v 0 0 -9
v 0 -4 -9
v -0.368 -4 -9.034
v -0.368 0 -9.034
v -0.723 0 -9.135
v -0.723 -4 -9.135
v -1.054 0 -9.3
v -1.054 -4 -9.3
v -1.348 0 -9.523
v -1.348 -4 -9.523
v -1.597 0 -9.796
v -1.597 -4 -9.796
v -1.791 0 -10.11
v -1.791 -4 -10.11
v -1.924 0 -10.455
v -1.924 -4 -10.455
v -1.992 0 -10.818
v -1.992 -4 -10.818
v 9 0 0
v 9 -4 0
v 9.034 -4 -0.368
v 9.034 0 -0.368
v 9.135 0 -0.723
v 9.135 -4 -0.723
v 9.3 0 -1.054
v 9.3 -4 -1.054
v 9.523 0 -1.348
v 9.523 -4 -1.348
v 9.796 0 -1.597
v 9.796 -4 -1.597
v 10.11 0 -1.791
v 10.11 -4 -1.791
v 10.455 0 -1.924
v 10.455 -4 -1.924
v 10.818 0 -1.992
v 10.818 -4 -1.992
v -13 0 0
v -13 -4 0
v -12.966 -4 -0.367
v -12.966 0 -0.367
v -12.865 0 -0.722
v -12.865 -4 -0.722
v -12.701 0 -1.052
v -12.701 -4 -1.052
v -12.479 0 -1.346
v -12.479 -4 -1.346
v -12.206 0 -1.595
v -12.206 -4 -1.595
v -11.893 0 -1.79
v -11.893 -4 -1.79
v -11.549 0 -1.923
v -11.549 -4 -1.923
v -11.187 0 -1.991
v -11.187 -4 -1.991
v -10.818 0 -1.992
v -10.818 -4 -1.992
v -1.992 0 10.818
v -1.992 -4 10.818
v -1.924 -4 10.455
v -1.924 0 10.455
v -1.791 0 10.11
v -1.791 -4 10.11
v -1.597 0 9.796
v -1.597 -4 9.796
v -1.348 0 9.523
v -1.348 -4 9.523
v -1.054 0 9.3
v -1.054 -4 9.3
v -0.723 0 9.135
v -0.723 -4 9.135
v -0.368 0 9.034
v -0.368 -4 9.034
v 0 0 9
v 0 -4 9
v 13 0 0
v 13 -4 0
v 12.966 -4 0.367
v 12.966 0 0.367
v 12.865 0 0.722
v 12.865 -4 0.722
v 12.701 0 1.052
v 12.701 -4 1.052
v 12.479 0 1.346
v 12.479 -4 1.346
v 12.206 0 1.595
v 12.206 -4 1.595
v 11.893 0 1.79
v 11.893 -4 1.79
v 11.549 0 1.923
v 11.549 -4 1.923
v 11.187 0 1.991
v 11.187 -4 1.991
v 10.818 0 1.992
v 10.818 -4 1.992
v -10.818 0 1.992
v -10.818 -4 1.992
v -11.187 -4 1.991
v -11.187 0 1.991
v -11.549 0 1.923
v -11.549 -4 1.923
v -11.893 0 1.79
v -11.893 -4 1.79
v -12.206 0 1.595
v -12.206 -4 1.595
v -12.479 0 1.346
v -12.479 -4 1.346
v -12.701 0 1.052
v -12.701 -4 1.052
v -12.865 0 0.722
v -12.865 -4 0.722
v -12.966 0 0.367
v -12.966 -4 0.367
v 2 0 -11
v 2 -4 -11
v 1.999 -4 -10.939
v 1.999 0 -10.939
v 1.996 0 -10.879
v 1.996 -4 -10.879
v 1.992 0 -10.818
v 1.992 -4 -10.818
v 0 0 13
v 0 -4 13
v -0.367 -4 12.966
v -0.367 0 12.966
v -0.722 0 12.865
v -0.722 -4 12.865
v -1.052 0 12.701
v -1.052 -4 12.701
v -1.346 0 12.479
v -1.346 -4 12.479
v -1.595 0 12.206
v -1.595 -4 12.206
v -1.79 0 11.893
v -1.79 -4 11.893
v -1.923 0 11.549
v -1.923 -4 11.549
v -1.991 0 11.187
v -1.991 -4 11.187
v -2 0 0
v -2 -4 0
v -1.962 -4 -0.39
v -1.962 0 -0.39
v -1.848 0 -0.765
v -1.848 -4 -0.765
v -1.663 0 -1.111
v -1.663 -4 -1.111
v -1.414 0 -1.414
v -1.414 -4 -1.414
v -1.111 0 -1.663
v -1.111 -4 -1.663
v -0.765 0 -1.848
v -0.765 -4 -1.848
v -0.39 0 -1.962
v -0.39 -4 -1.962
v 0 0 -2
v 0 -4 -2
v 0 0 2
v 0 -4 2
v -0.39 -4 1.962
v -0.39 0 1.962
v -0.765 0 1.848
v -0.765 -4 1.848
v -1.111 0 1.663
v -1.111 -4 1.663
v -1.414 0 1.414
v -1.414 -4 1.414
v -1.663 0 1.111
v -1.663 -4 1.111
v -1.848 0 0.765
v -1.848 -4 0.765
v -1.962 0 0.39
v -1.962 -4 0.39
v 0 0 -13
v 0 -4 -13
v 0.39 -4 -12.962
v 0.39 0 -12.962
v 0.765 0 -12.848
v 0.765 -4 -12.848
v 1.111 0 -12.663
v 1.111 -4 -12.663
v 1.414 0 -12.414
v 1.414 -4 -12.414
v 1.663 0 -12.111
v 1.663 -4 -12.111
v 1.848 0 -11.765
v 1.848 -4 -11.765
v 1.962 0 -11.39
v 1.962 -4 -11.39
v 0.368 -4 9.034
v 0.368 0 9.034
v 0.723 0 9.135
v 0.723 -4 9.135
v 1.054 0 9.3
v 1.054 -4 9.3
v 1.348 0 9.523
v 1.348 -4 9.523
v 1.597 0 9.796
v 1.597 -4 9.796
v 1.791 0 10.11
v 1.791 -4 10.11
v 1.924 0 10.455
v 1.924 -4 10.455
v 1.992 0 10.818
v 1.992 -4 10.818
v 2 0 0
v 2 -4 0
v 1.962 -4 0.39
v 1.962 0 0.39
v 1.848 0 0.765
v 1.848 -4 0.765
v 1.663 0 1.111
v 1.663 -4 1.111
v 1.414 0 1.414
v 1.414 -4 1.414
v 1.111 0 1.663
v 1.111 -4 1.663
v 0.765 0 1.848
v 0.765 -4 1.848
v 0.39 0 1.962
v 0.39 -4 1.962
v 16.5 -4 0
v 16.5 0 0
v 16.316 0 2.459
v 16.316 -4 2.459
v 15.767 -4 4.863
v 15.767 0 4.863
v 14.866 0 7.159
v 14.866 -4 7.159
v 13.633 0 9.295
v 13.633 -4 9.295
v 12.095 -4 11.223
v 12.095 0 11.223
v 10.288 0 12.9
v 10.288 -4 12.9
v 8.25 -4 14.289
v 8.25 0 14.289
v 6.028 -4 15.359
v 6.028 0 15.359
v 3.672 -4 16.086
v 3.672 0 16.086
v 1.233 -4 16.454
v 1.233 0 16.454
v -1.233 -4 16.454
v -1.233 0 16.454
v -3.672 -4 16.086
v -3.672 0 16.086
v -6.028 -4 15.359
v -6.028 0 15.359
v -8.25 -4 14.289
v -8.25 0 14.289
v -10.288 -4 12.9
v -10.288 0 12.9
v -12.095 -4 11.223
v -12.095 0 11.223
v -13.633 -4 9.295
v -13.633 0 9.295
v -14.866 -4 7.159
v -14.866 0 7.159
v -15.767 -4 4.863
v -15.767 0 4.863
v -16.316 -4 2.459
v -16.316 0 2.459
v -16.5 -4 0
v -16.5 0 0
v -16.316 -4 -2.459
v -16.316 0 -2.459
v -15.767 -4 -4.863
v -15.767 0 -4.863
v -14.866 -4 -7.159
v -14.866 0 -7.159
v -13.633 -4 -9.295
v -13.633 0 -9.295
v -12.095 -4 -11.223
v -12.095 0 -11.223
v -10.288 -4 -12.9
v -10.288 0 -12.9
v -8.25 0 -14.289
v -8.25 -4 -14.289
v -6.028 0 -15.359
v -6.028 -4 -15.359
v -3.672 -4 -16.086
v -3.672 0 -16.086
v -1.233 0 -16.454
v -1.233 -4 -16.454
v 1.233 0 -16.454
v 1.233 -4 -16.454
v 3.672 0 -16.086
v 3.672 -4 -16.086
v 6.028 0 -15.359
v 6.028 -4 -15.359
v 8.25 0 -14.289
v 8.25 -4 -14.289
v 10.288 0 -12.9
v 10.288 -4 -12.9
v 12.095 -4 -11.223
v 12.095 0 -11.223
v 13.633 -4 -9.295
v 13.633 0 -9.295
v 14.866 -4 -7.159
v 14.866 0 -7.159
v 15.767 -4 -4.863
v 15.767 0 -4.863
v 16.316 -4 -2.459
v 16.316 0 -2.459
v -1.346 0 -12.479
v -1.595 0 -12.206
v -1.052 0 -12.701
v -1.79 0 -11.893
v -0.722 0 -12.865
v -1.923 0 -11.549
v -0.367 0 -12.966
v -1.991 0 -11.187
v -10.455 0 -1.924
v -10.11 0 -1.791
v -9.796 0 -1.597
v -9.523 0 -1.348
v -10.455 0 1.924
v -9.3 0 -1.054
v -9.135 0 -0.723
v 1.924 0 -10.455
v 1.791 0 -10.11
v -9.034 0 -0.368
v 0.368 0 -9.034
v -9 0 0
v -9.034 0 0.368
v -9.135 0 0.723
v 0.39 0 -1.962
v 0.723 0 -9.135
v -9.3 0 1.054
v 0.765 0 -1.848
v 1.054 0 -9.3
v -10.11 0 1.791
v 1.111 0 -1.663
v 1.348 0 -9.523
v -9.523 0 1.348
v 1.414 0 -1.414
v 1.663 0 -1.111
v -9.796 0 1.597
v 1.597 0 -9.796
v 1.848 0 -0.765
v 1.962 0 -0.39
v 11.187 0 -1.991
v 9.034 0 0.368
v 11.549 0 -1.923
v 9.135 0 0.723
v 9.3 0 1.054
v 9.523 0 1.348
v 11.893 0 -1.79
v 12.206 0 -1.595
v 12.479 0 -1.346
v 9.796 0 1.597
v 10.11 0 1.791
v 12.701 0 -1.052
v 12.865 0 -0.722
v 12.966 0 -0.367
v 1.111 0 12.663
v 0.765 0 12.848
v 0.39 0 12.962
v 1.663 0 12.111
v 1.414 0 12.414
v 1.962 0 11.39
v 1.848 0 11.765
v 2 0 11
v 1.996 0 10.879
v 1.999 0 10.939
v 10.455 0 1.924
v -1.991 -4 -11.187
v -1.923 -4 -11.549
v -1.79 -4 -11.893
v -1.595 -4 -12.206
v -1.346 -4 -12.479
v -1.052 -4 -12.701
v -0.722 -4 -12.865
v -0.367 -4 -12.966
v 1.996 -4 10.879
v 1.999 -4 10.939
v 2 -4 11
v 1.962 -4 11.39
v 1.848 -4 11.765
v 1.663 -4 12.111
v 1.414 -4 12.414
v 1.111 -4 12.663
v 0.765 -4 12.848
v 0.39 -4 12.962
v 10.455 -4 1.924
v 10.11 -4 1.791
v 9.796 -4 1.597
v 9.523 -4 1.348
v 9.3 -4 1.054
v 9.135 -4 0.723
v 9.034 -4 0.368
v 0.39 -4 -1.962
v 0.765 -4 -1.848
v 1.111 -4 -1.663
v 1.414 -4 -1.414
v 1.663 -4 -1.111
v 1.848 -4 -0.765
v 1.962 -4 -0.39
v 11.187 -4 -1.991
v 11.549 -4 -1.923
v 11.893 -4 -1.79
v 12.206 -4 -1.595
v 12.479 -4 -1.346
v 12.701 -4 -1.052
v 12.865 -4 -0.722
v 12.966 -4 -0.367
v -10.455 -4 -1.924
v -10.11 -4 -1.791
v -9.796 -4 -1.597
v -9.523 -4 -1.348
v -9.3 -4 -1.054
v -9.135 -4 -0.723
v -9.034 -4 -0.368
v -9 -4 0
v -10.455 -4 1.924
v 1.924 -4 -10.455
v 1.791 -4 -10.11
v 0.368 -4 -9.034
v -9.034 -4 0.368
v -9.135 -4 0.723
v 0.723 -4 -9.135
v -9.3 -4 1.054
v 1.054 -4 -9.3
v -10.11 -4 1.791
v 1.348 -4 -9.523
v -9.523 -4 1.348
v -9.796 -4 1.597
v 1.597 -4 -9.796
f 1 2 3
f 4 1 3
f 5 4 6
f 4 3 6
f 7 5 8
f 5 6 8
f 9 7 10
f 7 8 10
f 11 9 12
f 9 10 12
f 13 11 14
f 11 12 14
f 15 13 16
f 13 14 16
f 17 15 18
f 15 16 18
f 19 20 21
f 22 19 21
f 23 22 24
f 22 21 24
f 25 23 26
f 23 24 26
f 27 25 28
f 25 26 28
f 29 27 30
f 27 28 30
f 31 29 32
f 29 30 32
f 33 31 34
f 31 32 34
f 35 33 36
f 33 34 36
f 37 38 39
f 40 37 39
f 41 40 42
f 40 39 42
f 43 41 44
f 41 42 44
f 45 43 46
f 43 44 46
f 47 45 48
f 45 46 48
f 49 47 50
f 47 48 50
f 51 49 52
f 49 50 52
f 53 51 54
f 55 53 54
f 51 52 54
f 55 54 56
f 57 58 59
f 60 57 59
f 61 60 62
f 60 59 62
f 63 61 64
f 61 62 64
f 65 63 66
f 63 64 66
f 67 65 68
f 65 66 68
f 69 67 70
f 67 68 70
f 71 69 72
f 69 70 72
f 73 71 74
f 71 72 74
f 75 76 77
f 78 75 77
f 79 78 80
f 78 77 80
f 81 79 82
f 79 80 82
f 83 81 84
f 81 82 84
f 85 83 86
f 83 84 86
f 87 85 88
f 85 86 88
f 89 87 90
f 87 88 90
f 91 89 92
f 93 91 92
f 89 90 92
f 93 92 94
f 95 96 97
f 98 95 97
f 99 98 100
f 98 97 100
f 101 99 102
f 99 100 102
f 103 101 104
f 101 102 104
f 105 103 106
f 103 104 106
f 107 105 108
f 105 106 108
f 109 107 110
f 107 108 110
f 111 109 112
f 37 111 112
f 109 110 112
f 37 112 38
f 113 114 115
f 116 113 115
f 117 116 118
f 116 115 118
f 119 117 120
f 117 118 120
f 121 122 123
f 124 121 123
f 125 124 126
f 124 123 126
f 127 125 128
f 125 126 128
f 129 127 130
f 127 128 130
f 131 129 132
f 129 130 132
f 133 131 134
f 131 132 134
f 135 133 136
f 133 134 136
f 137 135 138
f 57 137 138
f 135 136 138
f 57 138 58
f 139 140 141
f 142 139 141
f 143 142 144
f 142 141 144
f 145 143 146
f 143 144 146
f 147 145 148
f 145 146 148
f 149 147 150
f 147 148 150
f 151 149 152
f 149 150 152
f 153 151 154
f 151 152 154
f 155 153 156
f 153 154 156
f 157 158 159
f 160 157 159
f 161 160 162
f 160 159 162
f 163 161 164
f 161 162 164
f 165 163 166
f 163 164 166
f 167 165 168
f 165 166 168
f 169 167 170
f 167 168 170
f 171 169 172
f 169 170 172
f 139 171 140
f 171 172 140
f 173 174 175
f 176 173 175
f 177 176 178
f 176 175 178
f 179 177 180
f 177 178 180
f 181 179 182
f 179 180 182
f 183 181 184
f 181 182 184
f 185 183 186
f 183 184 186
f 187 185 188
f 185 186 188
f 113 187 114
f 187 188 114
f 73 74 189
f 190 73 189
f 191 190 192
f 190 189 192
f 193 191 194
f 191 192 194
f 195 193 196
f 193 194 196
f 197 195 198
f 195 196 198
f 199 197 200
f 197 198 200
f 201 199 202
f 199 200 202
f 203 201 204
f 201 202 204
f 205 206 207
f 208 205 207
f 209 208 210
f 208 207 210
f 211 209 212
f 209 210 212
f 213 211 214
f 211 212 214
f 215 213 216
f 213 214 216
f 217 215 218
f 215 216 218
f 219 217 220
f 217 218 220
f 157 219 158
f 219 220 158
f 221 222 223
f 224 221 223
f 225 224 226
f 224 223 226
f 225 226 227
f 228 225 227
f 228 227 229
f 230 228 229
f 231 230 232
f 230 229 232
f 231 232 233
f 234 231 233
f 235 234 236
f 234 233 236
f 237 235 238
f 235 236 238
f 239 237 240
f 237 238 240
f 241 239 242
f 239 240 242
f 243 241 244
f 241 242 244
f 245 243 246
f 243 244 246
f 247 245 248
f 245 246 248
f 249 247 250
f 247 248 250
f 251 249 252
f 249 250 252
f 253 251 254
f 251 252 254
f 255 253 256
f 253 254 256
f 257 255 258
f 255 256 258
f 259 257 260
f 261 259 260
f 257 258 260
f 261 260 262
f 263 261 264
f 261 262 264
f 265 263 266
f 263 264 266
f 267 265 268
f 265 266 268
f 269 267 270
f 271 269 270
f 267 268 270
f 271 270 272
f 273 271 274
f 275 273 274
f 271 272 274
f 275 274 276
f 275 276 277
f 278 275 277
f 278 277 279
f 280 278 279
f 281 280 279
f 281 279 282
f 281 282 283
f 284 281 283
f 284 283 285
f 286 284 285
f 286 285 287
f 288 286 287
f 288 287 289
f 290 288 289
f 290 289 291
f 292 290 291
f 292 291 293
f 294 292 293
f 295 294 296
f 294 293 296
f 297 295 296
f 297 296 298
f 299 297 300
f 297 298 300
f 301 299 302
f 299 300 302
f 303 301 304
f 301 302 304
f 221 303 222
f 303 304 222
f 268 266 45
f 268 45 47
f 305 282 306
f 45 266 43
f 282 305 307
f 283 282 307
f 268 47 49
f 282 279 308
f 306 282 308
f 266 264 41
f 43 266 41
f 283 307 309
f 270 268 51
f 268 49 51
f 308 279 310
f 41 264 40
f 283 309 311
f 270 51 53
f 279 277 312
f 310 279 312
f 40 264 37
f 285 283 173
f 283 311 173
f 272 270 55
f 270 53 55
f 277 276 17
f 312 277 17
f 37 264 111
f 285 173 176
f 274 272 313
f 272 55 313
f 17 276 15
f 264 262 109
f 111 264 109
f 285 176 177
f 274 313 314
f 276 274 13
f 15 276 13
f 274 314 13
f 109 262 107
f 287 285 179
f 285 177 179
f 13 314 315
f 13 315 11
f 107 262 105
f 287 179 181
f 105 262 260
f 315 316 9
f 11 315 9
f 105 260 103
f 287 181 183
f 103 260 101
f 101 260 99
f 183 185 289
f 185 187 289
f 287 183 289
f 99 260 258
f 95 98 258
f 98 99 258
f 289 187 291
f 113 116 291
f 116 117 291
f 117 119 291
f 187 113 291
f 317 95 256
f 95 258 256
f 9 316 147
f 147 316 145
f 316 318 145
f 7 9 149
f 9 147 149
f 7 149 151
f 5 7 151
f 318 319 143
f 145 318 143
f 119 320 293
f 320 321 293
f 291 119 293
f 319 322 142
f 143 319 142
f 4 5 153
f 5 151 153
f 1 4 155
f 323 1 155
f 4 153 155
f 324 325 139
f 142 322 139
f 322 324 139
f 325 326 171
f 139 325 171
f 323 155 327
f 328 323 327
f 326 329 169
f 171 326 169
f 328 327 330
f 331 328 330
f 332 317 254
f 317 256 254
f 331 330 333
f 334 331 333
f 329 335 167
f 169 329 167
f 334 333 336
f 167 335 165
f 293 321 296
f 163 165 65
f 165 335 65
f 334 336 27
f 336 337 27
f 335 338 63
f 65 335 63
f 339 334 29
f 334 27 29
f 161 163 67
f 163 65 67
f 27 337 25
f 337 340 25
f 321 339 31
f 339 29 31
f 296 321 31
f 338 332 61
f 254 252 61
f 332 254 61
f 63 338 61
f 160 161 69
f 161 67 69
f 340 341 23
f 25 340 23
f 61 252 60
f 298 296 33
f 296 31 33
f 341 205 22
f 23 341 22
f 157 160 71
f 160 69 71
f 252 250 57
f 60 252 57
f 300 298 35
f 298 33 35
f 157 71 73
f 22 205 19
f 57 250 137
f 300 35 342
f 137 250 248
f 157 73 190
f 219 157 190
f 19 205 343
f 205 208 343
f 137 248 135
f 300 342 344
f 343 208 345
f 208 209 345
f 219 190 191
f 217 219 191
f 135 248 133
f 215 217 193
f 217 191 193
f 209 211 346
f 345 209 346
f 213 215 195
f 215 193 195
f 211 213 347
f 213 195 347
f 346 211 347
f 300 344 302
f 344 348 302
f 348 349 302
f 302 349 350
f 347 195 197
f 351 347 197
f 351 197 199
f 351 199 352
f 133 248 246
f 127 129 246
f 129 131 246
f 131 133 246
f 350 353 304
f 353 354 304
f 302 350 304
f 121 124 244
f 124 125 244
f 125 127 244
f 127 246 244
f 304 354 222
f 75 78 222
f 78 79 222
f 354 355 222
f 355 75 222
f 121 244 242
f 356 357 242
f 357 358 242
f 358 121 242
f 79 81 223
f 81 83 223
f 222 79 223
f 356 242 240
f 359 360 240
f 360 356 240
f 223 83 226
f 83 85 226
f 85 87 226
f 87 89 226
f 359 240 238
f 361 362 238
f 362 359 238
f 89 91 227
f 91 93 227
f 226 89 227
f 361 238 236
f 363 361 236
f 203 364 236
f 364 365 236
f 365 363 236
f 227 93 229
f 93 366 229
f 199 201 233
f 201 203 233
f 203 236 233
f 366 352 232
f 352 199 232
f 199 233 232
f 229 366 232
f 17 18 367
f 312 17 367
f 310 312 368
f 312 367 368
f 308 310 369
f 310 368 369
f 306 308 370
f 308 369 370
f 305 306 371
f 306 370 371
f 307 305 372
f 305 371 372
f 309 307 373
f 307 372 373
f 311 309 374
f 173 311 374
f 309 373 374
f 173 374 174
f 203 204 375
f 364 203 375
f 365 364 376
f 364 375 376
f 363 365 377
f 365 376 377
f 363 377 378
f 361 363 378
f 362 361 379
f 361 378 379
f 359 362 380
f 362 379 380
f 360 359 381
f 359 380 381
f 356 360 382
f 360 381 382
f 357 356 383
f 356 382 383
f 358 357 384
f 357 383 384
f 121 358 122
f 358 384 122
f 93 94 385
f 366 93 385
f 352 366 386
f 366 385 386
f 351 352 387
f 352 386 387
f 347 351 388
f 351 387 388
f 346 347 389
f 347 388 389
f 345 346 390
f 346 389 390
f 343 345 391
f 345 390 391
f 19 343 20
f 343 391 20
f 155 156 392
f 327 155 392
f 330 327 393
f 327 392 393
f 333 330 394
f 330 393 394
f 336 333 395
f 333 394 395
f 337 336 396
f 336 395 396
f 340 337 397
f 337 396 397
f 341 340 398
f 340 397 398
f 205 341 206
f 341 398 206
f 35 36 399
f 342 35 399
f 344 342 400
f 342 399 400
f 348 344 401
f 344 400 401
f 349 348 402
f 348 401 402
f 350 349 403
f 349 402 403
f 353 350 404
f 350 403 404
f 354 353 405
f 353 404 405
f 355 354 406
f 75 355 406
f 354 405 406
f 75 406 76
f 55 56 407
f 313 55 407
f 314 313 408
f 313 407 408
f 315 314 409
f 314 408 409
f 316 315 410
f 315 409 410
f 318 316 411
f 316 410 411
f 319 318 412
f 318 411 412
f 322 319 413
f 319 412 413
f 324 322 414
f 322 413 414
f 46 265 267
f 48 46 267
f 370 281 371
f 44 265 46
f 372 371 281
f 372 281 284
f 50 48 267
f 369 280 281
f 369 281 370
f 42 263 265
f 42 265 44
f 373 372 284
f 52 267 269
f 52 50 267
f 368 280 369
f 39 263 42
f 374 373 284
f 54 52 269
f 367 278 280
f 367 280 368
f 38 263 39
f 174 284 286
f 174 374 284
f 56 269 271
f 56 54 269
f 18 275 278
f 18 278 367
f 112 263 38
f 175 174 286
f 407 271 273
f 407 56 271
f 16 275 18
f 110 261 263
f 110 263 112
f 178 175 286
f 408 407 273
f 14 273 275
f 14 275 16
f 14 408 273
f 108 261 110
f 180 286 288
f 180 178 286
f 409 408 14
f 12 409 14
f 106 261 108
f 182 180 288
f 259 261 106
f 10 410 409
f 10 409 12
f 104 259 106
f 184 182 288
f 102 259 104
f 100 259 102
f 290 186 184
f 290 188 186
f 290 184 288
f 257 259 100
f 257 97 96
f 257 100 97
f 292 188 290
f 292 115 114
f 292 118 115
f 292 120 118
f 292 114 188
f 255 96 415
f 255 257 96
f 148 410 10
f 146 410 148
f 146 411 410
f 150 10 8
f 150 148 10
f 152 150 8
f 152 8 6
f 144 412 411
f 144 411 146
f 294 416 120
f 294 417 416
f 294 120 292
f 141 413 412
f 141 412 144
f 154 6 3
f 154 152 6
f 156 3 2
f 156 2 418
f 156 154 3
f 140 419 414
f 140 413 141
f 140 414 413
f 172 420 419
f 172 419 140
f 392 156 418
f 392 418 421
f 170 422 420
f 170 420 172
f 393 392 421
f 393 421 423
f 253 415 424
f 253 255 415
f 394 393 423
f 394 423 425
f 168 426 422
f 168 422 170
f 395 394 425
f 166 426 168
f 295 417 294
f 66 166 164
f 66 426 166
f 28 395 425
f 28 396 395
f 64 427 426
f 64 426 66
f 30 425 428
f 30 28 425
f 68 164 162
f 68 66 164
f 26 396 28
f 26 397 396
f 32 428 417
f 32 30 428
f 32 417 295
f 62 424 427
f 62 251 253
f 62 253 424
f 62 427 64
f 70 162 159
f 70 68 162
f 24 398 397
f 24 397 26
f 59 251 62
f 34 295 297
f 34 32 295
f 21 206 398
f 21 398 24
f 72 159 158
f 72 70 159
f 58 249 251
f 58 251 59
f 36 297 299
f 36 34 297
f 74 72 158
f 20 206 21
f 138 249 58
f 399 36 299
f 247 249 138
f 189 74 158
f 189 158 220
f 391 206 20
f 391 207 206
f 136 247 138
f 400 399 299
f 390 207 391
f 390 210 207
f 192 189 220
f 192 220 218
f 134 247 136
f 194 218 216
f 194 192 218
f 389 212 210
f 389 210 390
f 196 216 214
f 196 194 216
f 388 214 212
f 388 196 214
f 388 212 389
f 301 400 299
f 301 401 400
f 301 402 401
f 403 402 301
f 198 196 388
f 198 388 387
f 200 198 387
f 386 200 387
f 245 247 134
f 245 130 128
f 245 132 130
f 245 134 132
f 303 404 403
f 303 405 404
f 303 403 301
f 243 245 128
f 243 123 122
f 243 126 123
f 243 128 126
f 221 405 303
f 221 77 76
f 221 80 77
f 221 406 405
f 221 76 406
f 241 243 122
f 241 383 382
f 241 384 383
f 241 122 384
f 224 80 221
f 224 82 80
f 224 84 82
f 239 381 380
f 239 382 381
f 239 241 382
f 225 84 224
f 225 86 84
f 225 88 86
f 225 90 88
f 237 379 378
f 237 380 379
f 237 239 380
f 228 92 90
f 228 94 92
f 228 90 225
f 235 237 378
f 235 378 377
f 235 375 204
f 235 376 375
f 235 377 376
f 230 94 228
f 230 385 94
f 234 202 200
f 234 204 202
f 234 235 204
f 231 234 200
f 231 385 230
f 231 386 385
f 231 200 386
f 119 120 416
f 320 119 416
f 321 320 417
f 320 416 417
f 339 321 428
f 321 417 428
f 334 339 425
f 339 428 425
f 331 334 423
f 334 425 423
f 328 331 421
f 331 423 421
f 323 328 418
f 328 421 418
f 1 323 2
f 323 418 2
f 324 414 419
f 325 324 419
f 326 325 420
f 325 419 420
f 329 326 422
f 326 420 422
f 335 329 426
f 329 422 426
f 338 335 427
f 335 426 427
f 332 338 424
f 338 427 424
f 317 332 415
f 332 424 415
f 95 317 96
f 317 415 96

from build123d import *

# Parameters (mm, degrees)
F0_R     = 16.5
F1_DEPTH = 4
F3_DEPTH = 4.001


with BuildPart() as f1:
    # F0 (on Front) → F1 (new body)
    with BuildSketch(Plane.XZ):
        Circle(F0_R)
    extrude(amount=F1_DEPTH)

    # F2 (on face) → F3 (cut, through all)
    with BuildSketch(Plane.XZ.offset(4)):
        with BuildLine():
            ThreePointArc((-10.8181818182, -1.9917183909), (-9.5229021082, -1.3483997249), (-9, 0))
            Line((-9, 0), (-9.5, 0))
            Line((-9.5, 0), (-11, 0))
            ThreePointArc((-11, 0), (-10.9544511501, -1), (-10.8181818182, -1.9917183909))
        make_face()
        with BuildLine():
            Line((-9.5, 0), (-9, 0))
            ThreePointArc((-9, 0), (-9.5229021082, 1.3483997249), (-10.8181818182, 1.9917183909))
            ThreePointArc((-10.8181818182, 1.9917183909), (-10.9544511501, 1), (-11, 0))
            Line((-11, 0), (-9.5, 0))
        make_face()
        with BuildLine():
            ThreePointArc((0, 2), (-1.4142135624, 1.4142135624), (-2, 0))
            Line((-2, 0), (0, 0))
            Line((0, 0), (0, 2))
        make_face()
        with BuildLine():
            Line((0, 0), (-2, 0))
            ThreePointArc((-2, 0), (-1.4142135624, -1.4142135624), (0, -2))
            Line((0, -2), (0, 0))
        make_face()
        with BuildLine():
            ThreePointArc((-11, 0), (-10.9544511501, 1), (-10.8181818182, 1.9917183909))
            ThreePointArc((-10.8181818182, 1.9917183909), (-12.3483997249, 1.4770978918), (-13, 0))
            Line((-13, 0), (-11, 0))
        make_face()
        with BuildLine():
            ThreePointArc((-13, 0), (-12.3483997249, -1.4770978918), (-10.8181818182, -1.9917183909))
            ThreePointArc((-10.8181818182, -1.9917183909), (-10.9544511501, -1), (-11, 0))
            Line((-11, 0), (-13, 0))
        make_face()
        with BuildLine():
            Line((2, 0), (0, 0))
            Line((0, 0), (0, -2))
            ThreePointArc((0, -2), (1.4142135624, -1.4142135624), (2, 0))
        make_face()
        with BuildLine():
            Line((0, 2), (0, 0))
            Line((0, 0), (2, 0))
            ThreePointArc((2, 0), (1.4142135624, 1.4142135624), (0, 2))
        make_face()
        with BuildLine():
            ThreePointArc((0, 13), (-1.4770978918, 12.3483997249), (-1.9917183909, 10.8181818182))
            ThreePointArc((-1.9917183909, 10.8181818182), (-1, 10.9544511501), (0, 11))
            Line((0, 11), (0, 13))
        make_face()
        with BuildLine():
            ThreePointArc((0, 11), (-1, 10.9544511501), (-1.9917183909, 10.8181818182))
            ThreePointArc((-1.9917183909, 10.8181818182), (-1.3483997249, 9.5229021082), (0, 9))
            Line((0, 9), (0, 9.5))
            Line((0, 9.5), (0, 11))
        make_face()
        with BuildLine():
            ThreePointArc((0, -9), (-1.3483997249, -9.5229021082), (-1.9917183909, -10.8181818182))
            ThreePointArc((-1.9917183909, -10.8181818182), (-1, -10.9544511501), (0, -11))
            Line((0, -11), (0, -9.5))
            Line((0, -9.5), (0, -9))
        make_face()
        with BuildLine():
            ThreePointArc((0, -11), (-1, -10.9544511501), (-1.9917183909, -10.8181818182))
            ThreePointArc((-1.9917183909, -10.8181818182), (-1.4770978918, -12.3483997249), (0, -13))
            Line((0, -13), (0, -11))
        make_face()
        with BuildLine():
            Line((0, 9.5), (0, 9))
            ThreePointArc((0, 9), (1.3483997249, 9.5229021082), (1.9917183909, 10.8181818182))
            ThreePointArc((1.9917183909, 10.8181818182), (1, 10.9544511501), (0, 11))
            Line((0, 11), (0, 9.5))
        make_face()
        with BuildLine():
            ThreePointArc((1.9917183909, -10.8181818182), (1.3483997249, -9.5229021082), (0, -9))
            Line((0, -9), (0, -9.5))
            Line((0, -9.5), (0, -11))
            ThreePointArc((0, -11), (1, -10.9544511501), (1.9917183909, -10.8181818182))
        make_face()
        with BuildLine():
            Line((0, 13), (0, 11))
            ThreePointArc((0, 11), (1, 10.9544511501), (1.9917183909, 10.8181818182))
            ThreePointArc((1.9917183909, 10.8181818182), (1.997928525, 10.9089966535), (2, 11))
            ThreePointArc((2, 11), (1.4142135624, 12.4142135624), (0, 13))
        make_face()
        with BuildLine():
            ThreePointArc((1.9917183909, -10.8181818182), (1, -10.9544511501), (0, -11))
            Line((0, -11), (0, -13))
            ThreePointArc((0, -13), (1.4142135624, -12.4142135624), (2, -11))
            ThreePointArc((2, -11), (1.997928525, -10.9089966535), (1.9917183909, -10.8181818182))
        make_face()
        with BuildLine():
            ThreePointArc((10.8181818182, 1.9917183909), (9.5229021082, 1.3483997249), (9, 0))
            Line((9, 0), (9.5, 0))
            Line((9.5, 0), (11, 0))
            ThreePointArc((11, 0), (10.9544511501, 1), (10.8181818182, 1.9917183909))
        make_face()
        with BuildLine():
            Line((9.5, 0), (9, 0))
            ThreePointArc((9, 0), (9.5229021082, -1.3483997249), (10.8181818182, -1.9917183909))
            ThreePointArc((10.8181818182, -1.9917183909), (10.9544511501, -1), (11, 0))
            Line((11, 0), (9.5, 0))
        make_face()
        with BuildLine():
            ThreePointArc((13, 0), (12.3483997249, 1.4770978918), (10.8181818182, 1.9917183909))
            ThreePointArc((10.8181818182, 1.9917183909), (10.9544511501, 1), (11, 0))
            Line((11, 0), (13, 0))
        make_face()
        with BuildLine():
            ThreePointArc((11, 0), (10.9544511501, -1), (10.8181818182, -1.9917183909))
            ThreePointArc((10.8181818182, -1.9917183909), (12.3483997249, -1.4770978918), (13, 0))
            Line((13, 0), (11, 0))
        make_face()
    extrude(amount=-F3_DEPTH, mode=Mode.SUBTRACT)


solid = f1.part
